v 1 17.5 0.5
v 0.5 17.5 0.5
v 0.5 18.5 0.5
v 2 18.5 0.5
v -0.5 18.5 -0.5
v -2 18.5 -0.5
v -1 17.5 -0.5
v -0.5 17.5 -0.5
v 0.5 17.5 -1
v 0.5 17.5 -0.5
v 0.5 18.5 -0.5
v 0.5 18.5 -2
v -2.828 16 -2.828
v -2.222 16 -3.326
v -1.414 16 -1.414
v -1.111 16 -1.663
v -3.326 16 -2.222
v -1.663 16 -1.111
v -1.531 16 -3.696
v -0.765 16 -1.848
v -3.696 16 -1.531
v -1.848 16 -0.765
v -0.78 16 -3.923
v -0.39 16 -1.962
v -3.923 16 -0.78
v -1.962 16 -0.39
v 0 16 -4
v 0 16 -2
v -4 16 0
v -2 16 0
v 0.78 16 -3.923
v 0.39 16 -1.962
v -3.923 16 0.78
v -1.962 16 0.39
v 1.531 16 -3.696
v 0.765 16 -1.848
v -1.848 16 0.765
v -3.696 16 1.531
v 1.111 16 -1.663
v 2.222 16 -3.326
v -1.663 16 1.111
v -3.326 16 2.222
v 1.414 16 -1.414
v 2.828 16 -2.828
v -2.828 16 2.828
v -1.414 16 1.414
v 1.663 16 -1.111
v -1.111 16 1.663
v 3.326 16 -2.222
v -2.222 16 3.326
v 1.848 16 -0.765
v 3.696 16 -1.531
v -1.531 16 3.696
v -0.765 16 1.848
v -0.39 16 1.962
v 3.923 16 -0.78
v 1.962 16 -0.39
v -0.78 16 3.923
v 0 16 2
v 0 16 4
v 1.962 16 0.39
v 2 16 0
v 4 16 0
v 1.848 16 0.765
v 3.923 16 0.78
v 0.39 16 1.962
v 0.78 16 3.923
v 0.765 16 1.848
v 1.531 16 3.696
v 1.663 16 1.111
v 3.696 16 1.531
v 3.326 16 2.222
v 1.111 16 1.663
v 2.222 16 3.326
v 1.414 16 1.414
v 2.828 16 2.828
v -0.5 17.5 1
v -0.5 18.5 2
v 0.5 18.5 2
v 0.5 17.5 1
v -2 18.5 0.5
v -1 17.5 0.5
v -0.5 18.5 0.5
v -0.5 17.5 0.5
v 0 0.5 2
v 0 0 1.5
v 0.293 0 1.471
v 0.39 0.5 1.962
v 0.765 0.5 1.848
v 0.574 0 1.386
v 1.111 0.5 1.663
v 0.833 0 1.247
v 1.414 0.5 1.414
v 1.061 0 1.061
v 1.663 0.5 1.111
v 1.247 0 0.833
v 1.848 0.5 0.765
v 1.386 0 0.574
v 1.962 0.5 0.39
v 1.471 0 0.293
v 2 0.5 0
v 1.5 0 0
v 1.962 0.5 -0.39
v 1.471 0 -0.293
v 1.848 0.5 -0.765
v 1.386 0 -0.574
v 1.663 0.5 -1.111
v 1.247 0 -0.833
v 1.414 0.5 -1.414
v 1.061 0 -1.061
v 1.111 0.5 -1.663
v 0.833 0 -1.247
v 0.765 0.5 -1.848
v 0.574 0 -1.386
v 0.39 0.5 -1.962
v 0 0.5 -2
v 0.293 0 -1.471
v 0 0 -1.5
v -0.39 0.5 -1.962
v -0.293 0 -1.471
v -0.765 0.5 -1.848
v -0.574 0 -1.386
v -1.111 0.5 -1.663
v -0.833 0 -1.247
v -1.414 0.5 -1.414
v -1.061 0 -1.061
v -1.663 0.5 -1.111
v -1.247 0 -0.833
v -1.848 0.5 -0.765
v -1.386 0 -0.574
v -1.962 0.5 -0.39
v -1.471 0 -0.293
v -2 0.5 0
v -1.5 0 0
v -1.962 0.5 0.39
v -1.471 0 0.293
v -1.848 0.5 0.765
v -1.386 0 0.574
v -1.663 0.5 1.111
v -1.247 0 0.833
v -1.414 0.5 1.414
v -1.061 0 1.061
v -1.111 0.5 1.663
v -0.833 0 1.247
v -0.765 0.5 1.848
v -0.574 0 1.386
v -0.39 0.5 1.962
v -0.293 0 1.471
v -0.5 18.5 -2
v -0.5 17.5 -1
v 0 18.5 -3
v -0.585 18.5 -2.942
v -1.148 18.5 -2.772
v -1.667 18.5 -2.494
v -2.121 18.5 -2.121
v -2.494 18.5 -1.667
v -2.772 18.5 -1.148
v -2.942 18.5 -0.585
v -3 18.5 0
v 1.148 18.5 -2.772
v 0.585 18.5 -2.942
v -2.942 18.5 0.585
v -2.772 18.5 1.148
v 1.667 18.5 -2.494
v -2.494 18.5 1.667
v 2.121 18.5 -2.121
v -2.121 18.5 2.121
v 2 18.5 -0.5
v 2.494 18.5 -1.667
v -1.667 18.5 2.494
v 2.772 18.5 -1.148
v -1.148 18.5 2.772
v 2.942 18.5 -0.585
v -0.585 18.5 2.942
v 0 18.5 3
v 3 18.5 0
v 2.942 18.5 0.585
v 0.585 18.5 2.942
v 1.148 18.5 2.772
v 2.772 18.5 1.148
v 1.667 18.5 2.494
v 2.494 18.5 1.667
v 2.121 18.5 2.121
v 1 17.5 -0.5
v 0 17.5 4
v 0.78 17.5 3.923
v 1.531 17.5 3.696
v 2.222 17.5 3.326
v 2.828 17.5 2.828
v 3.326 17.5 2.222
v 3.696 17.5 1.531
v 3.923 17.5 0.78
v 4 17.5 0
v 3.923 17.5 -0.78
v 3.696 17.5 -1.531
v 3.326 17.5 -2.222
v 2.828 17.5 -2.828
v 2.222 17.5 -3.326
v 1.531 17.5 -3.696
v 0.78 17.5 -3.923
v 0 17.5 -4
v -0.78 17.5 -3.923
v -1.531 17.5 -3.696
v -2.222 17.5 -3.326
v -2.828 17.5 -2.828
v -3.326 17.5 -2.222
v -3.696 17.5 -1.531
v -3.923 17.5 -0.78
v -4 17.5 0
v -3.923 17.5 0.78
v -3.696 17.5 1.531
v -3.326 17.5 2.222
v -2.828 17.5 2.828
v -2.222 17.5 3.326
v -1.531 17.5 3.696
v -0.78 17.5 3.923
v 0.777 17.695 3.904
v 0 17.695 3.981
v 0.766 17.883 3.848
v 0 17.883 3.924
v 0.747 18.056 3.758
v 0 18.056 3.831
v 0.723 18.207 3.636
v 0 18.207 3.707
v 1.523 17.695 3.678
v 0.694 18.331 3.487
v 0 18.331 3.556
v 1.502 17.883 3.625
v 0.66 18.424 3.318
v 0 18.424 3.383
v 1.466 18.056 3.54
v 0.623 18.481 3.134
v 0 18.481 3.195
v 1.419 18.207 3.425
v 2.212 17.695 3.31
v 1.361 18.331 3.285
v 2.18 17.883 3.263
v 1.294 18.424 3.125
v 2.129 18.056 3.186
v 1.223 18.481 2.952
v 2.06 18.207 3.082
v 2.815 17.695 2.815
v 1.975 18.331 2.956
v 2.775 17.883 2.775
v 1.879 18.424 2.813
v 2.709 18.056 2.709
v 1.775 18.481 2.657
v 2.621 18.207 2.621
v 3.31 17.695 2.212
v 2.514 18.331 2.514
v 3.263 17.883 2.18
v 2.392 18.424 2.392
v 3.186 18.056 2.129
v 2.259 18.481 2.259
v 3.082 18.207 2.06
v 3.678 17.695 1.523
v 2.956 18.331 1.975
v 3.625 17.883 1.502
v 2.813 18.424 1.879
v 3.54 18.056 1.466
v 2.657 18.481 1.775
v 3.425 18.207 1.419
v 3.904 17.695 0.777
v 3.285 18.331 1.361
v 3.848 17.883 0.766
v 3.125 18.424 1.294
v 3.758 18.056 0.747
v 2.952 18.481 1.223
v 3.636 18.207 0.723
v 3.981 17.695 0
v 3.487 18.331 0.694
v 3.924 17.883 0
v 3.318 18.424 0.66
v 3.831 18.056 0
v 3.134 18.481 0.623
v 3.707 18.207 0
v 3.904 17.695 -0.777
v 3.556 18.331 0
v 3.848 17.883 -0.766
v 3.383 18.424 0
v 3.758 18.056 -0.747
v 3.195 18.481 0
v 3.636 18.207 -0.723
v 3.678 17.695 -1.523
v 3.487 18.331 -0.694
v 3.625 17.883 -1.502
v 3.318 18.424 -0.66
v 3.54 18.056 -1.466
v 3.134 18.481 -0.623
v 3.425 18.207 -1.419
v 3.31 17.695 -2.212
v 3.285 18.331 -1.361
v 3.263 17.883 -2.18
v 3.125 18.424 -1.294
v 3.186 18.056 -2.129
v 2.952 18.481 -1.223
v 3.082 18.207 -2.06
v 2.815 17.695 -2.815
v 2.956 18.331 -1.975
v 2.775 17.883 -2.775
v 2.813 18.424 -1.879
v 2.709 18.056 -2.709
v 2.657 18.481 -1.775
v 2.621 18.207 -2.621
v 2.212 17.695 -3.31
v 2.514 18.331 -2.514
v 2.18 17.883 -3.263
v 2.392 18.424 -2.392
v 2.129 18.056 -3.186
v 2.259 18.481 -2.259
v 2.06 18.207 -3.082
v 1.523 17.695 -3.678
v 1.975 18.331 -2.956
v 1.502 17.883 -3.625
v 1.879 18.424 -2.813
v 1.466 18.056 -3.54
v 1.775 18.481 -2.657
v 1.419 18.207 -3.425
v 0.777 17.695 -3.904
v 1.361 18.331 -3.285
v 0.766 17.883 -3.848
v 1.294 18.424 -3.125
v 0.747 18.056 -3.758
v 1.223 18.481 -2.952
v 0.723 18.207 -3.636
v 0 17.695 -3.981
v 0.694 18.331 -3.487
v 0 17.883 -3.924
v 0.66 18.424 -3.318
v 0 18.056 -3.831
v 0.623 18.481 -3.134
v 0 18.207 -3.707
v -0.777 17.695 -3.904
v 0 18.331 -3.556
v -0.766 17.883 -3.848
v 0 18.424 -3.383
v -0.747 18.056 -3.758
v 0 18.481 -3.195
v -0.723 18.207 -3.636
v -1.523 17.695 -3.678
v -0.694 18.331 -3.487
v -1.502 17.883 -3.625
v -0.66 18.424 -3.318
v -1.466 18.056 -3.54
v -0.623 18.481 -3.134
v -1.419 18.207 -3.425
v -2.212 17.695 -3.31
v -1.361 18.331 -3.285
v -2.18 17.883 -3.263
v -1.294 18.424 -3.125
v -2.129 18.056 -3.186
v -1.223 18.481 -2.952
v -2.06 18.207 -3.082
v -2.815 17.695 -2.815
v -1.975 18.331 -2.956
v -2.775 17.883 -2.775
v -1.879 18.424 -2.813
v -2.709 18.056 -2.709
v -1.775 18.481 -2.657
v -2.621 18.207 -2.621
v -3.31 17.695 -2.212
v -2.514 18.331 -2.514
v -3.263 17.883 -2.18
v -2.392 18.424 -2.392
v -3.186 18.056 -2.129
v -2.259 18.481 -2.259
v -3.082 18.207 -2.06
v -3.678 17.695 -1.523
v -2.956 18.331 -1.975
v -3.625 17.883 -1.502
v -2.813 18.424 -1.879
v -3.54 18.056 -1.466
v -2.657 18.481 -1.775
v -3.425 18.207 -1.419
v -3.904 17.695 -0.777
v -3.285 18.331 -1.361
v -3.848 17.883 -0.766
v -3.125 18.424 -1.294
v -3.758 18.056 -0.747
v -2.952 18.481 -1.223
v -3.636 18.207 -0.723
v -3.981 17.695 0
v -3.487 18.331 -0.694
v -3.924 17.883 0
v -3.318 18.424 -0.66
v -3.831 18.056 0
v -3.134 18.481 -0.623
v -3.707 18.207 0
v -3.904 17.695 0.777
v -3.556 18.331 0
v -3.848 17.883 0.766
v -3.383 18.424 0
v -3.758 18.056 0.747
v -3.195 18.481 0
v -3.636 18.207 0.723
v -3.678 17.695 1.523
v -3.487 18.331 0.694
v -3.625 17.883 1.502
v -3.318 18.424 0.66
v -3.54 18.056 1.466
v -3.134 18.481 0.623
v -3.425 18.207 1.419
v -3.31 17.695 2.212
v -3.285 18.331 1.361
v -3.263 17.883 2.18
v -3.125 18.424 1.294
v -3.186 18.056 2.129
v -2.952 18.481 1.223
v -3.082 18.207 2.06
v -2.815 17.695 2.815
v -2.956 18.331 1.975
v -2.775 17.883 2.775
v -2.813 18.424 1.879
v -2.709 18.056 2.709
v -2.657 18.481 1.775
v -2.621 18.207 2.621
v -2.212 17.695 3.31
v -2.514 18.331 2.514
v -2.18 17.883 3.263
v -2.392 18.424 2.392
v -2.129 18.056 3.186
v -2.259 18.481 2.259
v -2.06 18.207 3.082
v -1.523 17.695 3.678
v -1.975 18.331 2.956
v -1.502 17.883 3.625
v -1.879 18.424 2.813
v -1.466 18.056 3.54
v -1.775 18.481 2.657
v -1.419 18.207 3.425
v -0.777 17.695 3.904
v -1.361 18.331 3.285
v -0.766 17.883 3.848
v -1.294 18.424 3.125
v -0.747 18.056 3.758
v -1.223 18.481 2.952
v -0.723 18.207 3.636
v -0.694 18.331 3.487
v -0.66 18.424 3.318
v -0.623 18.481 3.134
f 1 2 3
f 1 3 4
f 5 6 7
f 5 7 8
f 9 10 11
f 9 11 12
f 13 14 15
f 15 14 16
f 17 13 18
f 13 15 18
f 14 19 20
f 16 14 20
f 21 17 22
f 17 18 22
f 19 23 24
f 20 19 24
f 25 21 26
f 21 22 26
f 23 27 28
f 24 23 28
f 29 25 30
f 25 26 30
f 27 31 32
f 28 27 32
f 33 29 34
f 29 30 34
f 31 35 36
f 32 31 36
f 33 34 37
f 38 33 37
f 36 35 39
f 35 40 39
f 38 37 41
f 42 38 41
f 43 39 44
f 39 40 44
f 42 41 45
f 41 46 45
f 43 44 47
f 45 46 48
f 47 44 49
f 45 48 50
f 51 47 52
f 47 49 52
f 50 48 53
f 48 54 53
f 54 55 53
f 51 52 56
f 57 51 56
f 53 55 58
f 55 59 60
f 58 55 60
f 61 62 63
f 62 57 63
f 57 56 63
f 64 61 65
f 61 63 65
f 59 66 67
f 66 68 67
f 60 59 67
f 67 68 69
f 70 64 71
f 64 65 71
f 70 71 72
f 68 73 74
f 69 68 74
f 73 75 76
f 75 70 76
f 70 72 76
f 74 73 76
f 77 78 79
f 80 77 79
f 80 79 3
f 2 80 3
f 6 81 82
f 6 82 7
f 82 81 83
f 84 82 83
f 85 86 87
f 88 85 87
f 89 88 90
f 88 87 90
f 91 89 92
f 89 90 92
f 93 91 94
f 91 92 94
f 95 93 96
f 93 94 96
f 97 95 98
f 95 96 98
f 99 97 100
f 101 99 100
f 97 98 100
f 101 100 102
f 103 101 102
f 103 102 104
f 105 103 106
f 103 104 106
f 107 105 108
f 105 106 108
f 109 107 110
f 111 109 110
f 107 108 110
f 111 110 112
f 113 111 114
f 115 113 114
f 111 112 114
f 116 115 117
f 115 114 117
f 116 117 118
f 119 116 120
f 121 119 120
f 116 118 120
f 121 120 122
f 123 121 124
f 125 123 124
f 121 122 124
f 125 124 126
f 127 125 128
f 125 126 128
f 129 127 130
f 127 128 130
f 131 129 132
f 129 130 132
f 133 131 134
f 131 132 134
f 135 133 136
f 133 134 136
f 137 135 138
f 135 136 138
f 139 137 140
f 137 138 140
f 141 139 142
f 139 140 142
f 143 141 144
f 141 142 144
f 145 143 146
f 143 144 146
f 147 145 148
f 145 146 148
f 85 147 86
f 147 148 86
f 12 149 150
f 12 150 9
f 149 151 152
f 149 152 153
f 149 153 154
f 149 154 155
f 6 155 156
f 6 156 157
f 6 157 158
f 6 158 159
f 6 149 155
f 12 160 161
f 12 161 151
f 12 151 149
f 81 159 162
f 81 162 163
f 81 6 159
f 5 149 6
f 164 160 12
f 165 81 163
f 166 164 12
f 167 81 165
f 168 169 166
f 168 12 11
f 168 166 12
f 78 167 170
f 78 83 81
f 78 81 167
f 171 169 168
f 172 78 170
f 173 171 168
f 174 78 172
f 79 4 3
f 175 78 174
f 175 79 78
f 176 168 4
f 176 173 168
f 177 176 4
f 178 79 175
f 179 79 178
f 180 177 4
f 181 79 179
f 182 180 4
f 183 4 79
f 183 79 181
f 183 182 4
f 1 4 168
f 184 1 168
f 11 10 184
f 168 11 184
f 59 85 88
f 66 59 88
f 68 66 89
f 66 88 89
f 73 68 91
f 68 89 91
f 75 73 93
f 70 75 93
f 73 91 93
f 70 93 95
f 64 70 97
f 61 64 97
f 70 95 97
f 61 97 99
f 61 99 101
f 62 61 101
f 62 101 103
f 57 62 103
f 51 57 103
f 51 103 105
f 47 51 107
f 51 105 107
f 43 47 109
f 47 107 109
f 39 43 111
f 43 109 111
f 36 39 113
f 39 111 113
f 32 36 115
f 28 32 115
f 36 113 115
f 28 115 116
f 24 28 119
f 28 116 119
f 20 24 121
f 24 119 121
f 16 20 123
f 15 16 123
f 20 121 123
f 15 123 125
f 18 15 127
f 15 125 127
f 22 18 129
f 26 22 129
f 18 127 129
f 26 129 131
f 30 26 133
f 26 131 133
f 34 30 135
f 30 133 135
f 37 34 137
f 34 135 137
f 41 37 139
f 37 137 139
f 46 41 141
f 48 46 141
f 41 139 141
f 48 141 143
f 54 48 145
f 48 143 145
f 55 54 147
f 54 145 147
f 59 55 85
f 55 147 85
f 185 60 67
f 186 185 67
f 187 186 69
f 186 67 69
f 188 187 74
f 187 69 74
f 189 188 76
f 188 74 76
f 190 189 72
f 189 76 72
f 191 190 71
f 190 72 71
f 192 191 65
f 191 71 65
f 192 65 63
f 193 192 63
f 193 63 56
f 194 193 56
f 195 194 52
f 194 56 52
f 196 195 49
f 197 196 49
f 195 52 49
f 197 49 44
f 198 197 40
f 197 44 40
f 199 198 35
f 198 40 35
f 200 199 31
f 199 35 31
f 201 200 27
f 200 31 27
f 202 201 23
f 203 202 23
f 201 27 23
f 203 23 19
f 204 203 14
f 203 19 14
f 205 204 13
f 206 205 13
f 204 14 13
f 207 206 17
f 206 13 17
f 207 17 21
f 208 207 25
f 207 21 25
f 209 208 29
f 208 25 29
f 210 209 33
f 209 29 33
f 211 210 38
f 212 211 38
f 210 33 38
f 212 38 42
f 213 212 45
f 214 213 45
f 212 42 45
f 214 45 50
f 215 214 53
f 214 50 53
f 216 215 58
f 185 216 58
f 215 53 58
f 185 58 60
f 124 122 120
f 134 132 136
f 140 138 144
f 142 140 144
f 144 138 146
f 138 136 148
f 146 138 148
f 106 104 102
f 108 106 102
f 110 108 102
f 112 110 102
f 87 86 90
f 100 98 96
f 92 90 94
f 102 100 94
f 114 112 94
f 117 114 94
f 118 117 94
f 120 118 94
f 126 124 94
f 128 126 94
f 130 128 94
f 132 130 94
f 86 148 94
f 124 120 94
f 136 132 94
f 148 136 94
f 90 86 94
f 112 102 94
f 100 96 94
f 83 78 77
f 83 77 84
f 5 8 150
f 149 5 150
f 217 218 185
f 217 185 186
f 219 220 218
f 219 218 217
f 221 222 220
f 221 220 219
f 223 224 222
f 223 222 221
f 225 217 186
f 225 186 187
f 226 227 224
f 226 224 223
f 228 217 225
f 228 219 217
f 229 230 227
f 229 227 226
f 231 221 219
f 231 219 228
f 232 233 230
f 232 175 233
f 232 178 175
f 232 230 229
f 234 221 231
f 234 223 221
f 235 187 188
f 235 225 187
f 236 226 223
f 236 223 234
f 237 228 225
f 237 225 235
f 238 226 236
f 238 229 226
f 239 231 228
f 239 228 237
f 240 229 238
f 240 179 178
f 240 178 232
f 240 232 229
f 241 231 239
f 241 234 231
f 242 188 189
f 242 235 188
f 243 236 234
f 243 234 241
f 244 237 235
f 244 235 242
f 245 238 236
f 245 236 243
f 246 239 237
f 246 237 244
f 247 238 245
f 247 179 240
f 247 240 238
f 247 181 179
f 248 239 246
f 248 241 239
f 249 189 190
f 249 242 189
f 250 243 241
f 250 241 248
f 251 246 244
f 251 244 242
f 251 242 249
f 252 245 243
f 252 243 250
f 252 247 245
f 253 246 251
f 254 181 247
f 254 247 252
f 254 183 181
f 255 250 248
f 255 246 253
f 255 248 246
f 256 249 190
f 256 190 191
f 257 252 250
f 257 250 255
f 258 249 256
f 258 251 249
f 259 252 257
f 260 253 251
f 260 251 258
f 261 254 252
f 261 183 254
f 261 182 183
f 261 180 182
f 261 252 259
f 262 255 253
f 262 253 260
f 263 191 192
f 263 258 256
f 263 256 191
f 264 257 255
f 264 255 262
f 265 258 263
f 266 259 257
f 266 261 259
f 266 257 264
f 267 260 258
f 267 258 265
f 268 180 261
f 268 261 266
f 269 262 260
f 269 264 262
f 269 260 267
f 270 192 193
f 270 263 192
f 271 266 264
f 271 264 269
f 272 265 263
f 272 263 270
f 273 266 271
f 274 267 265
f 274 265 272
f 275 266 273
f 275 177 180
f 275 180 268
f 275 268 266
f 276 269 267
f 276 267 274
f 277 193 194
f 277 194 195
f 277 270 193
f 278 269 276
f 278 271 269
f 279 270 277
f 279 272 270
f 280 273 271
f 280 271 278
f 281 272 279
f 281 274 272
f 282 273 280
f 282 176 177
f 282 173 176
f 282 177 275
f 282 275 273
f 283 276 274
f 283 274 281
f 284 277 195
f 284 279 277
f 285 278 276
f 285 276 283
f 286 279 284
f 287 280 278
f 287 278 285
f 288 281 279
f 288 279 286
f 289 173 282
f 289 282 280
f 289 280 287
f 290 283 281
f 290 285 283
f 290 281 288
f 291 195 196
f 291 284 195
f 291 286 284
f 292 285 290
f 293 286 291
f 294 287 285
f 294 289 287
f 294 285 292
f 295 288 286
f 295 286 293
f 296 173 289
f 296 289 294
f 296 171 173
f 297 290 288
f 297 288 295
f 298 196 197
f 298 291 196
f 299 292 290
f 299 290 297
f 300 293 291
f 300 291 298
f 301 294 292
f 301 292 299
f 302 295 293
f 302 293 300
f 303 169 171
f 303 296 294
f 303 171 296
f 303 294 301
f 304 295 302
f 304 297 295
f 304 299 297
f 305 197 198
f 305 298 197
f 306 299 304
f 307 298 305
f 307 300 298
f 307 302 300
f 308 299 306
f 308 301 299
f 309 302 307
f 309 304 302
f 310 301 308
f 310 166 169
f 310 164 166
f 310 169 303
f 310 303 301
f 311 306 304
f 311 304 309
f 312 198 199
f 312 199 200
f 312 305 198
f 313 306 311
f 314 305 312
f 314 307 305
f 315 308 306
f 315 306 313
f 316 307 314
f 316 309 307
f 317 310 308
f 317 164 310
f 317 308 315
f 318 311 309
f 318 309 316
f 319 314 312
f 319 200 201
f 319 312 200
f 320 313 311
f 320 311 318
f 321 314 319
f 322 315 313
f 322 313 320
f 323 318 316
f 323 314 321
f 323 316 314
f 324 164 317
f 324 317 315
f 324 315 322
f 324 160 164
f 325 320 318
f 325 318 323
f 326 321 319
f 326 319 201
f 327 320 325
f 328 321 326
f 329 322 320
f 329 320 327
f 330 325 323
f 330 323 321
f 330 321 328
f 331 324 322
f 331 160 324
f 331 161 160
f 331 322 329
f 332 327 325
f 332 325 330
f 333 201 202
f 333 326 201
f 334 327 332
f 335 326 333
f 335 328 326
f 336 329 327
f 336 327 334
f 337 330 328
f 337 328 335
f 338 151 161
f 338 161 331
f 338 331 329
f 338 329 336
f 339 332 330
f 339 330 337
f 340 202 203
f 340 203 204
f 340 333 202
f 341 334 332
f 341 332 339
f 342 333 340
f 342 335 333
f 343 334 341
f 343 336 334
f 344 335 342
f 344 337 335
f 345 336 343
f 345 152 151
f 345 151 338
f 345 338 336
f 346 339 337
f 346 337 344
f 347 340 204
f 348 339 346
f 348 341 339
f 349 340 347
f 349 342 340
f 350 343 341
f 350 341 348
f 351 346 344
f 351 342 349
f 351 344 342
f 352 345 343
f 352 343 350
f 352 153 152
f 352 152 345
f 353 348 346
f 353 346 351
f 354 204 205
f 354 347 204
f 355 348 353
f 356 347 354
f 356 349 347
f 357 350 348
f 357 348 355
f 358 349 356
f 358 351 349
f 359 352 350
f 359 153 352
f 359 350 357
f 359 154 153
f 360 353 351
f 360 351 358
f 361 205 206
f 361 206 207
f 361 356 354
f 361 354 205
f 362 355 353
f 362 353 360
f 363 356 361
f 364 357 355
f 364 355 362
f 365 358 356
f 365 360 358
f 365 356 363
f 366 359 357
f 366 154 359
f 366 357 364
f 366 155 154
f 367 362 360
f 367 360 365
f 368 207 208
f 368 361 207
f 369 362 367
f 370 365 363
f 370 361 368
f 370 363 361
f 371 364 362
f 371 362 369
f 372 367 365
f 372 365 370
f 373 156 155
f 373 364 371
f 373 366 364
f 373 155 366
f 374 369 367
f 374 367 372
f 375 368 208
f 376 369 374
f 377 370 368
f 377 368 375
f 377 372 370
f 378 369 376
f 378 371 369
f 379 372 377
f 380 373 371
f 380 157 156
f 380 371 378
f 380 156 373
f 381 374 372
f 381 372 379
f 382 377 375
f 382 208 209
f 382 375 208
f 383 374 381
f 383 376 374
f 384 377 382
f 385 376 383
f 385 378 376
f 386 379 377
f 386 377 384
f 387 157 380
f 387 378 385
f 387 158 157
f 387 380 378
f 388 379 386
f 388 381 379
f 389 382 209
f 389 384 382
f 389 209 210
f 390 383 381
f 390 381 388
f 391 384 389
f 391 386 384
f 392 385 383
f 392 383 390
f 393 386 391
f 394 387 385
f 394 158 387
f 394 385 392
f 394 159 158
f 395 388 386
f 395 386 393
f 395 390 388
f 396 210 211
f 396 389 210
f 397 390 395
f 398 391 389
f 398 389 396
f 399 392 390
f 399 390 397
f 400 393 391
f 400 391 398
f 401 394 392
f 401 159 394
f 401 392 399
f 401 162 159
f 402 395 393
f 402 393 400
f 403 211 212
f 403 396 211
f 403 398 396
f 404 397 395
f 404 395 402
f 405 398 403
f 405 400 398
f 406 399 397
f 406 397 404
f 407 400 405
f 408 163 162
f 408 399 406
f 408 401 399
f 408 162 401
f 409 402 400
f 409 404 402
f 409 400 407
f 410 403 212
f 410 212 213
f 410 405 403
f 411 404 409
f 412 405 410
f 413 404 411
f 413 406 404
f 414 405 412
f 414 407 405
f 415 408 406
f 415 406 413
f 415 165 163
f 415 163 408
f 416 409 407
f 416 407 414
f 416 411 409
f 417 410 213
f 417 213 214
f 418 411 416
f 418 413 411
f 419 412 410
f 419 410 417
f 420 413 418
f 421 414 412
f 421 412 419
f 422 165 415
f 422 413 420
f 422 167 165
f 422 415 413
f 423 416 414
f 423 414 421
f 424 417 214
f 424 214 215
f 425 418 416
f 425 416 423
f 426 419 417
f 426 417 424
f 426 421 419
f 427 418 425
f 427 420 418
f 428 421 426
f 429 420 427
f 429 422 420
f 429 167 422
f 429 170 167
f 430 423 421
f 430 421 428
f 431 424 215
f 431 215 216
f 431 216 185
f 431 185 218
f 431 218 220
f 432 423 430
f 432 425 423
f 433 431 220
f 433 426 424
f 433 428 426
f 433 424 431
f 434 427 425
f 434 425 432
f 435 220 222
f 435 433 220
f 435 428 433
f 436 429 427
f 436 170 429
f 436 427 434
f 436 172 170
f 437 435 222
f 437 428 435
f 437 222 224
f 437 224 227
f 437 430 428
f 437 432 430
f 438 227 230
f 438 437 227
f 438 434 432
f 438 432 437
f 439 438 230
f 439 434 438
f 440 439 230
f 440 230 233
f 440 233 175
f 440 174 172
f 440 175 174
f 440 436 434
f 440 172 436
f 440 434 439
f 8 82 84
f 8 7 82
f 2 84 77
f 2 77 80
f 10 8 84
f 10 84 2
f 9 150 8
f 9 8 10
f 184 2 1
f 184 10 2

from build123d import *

# Parameters (mm, degrees)
SKETCH_1_R          = 2
EXTRUDE_1_DEPTH     = 16
SKETCH_2_R          = 4
EXTRUDE_2_DEPTH     = 2.5
FILLET_1_R          = 1
CHAMFER_1_SIZE      = 0.5
SKETCH_3_W          = 4
SKETCH_3_H          = 1
SKETCH_3_W_2        = 1
SKETCH_3_H_2        = 4
CUT_EXTRUDE_1_DEPTH = 1
CHAMFER_2_SIZE      = 1


with BuildPart() as part:
    # 草图1 → 凸台-拉伸1 (new body)
    with BuildSketch(Plane(origin=(0, 0, 0), x_dir=(1, 0, 0), z_dir=(0, 1, 0))):
        with Locations(Location((0, 0, 0), (0, 0, 270))):
            Circle(SKETCH_1_R)
    extrude(amount=EXTRUDE_1_DEPTH)

    # 草图2 → 凸台-拉伸2 (add)
    with BuildSketch(Plane(origin=(0, 16, 0), x_dir=(1, 0, 0), z_dir=(0, 1, 0))):
        with Locations(Location((0, 0, 0), (0, 0, 270))):
            Circle(SKETCH_2_R)
    extrude(amount=EXTRUDE_2_DEPTH)

    # 圆角1
    fillet_1_edges = [part.edges().sort_by_distance(p)[0] for p in [
        (0, 18.5, -4),
    ]]
    fillet(fillet_1_edges, radius=FILLET_1_R)

    # 倒角1
    chamfer_1_edges = [part.edges().sort_by_distance(p)[0] for p in [
        (0, 0, -2),
    ]]
    chamfer(chamfer_1_edges, length=CHAMFER_1_SIZE)

    # 草图3 → 切除-拉伸-薄壁1 (cut)
    with BuildSketch(Plane(origin=(0, 18.5, 0), x_dir=(1, 0, 0), z_dir=(0, 1, 0))):
        Rectangle(SKETCH_3_W, SKETCH_3_H)
        Rectangle(SKETCH_3_W_2, SKETCH_3_H_2)
    extrude(amount=-CUT_EXTRUDE_1_DEPTH, mode=Mode.SUBTRACT)

    # 倒角2
    chamfer_2_edges = [part.edges().sort_by_distance(p)[0] for p in [
        (0, 17.5, 2),
        (2, 17.5, 0),
        (0, 17.5, -2),
        (-2, 17.5, 0),
    ]]
    chamfer(chamfer_2_edges, length=CHAMFER_2_SIZE - 0.0001)  # a hair under: the kernel refuses the full size


solid = part.part
